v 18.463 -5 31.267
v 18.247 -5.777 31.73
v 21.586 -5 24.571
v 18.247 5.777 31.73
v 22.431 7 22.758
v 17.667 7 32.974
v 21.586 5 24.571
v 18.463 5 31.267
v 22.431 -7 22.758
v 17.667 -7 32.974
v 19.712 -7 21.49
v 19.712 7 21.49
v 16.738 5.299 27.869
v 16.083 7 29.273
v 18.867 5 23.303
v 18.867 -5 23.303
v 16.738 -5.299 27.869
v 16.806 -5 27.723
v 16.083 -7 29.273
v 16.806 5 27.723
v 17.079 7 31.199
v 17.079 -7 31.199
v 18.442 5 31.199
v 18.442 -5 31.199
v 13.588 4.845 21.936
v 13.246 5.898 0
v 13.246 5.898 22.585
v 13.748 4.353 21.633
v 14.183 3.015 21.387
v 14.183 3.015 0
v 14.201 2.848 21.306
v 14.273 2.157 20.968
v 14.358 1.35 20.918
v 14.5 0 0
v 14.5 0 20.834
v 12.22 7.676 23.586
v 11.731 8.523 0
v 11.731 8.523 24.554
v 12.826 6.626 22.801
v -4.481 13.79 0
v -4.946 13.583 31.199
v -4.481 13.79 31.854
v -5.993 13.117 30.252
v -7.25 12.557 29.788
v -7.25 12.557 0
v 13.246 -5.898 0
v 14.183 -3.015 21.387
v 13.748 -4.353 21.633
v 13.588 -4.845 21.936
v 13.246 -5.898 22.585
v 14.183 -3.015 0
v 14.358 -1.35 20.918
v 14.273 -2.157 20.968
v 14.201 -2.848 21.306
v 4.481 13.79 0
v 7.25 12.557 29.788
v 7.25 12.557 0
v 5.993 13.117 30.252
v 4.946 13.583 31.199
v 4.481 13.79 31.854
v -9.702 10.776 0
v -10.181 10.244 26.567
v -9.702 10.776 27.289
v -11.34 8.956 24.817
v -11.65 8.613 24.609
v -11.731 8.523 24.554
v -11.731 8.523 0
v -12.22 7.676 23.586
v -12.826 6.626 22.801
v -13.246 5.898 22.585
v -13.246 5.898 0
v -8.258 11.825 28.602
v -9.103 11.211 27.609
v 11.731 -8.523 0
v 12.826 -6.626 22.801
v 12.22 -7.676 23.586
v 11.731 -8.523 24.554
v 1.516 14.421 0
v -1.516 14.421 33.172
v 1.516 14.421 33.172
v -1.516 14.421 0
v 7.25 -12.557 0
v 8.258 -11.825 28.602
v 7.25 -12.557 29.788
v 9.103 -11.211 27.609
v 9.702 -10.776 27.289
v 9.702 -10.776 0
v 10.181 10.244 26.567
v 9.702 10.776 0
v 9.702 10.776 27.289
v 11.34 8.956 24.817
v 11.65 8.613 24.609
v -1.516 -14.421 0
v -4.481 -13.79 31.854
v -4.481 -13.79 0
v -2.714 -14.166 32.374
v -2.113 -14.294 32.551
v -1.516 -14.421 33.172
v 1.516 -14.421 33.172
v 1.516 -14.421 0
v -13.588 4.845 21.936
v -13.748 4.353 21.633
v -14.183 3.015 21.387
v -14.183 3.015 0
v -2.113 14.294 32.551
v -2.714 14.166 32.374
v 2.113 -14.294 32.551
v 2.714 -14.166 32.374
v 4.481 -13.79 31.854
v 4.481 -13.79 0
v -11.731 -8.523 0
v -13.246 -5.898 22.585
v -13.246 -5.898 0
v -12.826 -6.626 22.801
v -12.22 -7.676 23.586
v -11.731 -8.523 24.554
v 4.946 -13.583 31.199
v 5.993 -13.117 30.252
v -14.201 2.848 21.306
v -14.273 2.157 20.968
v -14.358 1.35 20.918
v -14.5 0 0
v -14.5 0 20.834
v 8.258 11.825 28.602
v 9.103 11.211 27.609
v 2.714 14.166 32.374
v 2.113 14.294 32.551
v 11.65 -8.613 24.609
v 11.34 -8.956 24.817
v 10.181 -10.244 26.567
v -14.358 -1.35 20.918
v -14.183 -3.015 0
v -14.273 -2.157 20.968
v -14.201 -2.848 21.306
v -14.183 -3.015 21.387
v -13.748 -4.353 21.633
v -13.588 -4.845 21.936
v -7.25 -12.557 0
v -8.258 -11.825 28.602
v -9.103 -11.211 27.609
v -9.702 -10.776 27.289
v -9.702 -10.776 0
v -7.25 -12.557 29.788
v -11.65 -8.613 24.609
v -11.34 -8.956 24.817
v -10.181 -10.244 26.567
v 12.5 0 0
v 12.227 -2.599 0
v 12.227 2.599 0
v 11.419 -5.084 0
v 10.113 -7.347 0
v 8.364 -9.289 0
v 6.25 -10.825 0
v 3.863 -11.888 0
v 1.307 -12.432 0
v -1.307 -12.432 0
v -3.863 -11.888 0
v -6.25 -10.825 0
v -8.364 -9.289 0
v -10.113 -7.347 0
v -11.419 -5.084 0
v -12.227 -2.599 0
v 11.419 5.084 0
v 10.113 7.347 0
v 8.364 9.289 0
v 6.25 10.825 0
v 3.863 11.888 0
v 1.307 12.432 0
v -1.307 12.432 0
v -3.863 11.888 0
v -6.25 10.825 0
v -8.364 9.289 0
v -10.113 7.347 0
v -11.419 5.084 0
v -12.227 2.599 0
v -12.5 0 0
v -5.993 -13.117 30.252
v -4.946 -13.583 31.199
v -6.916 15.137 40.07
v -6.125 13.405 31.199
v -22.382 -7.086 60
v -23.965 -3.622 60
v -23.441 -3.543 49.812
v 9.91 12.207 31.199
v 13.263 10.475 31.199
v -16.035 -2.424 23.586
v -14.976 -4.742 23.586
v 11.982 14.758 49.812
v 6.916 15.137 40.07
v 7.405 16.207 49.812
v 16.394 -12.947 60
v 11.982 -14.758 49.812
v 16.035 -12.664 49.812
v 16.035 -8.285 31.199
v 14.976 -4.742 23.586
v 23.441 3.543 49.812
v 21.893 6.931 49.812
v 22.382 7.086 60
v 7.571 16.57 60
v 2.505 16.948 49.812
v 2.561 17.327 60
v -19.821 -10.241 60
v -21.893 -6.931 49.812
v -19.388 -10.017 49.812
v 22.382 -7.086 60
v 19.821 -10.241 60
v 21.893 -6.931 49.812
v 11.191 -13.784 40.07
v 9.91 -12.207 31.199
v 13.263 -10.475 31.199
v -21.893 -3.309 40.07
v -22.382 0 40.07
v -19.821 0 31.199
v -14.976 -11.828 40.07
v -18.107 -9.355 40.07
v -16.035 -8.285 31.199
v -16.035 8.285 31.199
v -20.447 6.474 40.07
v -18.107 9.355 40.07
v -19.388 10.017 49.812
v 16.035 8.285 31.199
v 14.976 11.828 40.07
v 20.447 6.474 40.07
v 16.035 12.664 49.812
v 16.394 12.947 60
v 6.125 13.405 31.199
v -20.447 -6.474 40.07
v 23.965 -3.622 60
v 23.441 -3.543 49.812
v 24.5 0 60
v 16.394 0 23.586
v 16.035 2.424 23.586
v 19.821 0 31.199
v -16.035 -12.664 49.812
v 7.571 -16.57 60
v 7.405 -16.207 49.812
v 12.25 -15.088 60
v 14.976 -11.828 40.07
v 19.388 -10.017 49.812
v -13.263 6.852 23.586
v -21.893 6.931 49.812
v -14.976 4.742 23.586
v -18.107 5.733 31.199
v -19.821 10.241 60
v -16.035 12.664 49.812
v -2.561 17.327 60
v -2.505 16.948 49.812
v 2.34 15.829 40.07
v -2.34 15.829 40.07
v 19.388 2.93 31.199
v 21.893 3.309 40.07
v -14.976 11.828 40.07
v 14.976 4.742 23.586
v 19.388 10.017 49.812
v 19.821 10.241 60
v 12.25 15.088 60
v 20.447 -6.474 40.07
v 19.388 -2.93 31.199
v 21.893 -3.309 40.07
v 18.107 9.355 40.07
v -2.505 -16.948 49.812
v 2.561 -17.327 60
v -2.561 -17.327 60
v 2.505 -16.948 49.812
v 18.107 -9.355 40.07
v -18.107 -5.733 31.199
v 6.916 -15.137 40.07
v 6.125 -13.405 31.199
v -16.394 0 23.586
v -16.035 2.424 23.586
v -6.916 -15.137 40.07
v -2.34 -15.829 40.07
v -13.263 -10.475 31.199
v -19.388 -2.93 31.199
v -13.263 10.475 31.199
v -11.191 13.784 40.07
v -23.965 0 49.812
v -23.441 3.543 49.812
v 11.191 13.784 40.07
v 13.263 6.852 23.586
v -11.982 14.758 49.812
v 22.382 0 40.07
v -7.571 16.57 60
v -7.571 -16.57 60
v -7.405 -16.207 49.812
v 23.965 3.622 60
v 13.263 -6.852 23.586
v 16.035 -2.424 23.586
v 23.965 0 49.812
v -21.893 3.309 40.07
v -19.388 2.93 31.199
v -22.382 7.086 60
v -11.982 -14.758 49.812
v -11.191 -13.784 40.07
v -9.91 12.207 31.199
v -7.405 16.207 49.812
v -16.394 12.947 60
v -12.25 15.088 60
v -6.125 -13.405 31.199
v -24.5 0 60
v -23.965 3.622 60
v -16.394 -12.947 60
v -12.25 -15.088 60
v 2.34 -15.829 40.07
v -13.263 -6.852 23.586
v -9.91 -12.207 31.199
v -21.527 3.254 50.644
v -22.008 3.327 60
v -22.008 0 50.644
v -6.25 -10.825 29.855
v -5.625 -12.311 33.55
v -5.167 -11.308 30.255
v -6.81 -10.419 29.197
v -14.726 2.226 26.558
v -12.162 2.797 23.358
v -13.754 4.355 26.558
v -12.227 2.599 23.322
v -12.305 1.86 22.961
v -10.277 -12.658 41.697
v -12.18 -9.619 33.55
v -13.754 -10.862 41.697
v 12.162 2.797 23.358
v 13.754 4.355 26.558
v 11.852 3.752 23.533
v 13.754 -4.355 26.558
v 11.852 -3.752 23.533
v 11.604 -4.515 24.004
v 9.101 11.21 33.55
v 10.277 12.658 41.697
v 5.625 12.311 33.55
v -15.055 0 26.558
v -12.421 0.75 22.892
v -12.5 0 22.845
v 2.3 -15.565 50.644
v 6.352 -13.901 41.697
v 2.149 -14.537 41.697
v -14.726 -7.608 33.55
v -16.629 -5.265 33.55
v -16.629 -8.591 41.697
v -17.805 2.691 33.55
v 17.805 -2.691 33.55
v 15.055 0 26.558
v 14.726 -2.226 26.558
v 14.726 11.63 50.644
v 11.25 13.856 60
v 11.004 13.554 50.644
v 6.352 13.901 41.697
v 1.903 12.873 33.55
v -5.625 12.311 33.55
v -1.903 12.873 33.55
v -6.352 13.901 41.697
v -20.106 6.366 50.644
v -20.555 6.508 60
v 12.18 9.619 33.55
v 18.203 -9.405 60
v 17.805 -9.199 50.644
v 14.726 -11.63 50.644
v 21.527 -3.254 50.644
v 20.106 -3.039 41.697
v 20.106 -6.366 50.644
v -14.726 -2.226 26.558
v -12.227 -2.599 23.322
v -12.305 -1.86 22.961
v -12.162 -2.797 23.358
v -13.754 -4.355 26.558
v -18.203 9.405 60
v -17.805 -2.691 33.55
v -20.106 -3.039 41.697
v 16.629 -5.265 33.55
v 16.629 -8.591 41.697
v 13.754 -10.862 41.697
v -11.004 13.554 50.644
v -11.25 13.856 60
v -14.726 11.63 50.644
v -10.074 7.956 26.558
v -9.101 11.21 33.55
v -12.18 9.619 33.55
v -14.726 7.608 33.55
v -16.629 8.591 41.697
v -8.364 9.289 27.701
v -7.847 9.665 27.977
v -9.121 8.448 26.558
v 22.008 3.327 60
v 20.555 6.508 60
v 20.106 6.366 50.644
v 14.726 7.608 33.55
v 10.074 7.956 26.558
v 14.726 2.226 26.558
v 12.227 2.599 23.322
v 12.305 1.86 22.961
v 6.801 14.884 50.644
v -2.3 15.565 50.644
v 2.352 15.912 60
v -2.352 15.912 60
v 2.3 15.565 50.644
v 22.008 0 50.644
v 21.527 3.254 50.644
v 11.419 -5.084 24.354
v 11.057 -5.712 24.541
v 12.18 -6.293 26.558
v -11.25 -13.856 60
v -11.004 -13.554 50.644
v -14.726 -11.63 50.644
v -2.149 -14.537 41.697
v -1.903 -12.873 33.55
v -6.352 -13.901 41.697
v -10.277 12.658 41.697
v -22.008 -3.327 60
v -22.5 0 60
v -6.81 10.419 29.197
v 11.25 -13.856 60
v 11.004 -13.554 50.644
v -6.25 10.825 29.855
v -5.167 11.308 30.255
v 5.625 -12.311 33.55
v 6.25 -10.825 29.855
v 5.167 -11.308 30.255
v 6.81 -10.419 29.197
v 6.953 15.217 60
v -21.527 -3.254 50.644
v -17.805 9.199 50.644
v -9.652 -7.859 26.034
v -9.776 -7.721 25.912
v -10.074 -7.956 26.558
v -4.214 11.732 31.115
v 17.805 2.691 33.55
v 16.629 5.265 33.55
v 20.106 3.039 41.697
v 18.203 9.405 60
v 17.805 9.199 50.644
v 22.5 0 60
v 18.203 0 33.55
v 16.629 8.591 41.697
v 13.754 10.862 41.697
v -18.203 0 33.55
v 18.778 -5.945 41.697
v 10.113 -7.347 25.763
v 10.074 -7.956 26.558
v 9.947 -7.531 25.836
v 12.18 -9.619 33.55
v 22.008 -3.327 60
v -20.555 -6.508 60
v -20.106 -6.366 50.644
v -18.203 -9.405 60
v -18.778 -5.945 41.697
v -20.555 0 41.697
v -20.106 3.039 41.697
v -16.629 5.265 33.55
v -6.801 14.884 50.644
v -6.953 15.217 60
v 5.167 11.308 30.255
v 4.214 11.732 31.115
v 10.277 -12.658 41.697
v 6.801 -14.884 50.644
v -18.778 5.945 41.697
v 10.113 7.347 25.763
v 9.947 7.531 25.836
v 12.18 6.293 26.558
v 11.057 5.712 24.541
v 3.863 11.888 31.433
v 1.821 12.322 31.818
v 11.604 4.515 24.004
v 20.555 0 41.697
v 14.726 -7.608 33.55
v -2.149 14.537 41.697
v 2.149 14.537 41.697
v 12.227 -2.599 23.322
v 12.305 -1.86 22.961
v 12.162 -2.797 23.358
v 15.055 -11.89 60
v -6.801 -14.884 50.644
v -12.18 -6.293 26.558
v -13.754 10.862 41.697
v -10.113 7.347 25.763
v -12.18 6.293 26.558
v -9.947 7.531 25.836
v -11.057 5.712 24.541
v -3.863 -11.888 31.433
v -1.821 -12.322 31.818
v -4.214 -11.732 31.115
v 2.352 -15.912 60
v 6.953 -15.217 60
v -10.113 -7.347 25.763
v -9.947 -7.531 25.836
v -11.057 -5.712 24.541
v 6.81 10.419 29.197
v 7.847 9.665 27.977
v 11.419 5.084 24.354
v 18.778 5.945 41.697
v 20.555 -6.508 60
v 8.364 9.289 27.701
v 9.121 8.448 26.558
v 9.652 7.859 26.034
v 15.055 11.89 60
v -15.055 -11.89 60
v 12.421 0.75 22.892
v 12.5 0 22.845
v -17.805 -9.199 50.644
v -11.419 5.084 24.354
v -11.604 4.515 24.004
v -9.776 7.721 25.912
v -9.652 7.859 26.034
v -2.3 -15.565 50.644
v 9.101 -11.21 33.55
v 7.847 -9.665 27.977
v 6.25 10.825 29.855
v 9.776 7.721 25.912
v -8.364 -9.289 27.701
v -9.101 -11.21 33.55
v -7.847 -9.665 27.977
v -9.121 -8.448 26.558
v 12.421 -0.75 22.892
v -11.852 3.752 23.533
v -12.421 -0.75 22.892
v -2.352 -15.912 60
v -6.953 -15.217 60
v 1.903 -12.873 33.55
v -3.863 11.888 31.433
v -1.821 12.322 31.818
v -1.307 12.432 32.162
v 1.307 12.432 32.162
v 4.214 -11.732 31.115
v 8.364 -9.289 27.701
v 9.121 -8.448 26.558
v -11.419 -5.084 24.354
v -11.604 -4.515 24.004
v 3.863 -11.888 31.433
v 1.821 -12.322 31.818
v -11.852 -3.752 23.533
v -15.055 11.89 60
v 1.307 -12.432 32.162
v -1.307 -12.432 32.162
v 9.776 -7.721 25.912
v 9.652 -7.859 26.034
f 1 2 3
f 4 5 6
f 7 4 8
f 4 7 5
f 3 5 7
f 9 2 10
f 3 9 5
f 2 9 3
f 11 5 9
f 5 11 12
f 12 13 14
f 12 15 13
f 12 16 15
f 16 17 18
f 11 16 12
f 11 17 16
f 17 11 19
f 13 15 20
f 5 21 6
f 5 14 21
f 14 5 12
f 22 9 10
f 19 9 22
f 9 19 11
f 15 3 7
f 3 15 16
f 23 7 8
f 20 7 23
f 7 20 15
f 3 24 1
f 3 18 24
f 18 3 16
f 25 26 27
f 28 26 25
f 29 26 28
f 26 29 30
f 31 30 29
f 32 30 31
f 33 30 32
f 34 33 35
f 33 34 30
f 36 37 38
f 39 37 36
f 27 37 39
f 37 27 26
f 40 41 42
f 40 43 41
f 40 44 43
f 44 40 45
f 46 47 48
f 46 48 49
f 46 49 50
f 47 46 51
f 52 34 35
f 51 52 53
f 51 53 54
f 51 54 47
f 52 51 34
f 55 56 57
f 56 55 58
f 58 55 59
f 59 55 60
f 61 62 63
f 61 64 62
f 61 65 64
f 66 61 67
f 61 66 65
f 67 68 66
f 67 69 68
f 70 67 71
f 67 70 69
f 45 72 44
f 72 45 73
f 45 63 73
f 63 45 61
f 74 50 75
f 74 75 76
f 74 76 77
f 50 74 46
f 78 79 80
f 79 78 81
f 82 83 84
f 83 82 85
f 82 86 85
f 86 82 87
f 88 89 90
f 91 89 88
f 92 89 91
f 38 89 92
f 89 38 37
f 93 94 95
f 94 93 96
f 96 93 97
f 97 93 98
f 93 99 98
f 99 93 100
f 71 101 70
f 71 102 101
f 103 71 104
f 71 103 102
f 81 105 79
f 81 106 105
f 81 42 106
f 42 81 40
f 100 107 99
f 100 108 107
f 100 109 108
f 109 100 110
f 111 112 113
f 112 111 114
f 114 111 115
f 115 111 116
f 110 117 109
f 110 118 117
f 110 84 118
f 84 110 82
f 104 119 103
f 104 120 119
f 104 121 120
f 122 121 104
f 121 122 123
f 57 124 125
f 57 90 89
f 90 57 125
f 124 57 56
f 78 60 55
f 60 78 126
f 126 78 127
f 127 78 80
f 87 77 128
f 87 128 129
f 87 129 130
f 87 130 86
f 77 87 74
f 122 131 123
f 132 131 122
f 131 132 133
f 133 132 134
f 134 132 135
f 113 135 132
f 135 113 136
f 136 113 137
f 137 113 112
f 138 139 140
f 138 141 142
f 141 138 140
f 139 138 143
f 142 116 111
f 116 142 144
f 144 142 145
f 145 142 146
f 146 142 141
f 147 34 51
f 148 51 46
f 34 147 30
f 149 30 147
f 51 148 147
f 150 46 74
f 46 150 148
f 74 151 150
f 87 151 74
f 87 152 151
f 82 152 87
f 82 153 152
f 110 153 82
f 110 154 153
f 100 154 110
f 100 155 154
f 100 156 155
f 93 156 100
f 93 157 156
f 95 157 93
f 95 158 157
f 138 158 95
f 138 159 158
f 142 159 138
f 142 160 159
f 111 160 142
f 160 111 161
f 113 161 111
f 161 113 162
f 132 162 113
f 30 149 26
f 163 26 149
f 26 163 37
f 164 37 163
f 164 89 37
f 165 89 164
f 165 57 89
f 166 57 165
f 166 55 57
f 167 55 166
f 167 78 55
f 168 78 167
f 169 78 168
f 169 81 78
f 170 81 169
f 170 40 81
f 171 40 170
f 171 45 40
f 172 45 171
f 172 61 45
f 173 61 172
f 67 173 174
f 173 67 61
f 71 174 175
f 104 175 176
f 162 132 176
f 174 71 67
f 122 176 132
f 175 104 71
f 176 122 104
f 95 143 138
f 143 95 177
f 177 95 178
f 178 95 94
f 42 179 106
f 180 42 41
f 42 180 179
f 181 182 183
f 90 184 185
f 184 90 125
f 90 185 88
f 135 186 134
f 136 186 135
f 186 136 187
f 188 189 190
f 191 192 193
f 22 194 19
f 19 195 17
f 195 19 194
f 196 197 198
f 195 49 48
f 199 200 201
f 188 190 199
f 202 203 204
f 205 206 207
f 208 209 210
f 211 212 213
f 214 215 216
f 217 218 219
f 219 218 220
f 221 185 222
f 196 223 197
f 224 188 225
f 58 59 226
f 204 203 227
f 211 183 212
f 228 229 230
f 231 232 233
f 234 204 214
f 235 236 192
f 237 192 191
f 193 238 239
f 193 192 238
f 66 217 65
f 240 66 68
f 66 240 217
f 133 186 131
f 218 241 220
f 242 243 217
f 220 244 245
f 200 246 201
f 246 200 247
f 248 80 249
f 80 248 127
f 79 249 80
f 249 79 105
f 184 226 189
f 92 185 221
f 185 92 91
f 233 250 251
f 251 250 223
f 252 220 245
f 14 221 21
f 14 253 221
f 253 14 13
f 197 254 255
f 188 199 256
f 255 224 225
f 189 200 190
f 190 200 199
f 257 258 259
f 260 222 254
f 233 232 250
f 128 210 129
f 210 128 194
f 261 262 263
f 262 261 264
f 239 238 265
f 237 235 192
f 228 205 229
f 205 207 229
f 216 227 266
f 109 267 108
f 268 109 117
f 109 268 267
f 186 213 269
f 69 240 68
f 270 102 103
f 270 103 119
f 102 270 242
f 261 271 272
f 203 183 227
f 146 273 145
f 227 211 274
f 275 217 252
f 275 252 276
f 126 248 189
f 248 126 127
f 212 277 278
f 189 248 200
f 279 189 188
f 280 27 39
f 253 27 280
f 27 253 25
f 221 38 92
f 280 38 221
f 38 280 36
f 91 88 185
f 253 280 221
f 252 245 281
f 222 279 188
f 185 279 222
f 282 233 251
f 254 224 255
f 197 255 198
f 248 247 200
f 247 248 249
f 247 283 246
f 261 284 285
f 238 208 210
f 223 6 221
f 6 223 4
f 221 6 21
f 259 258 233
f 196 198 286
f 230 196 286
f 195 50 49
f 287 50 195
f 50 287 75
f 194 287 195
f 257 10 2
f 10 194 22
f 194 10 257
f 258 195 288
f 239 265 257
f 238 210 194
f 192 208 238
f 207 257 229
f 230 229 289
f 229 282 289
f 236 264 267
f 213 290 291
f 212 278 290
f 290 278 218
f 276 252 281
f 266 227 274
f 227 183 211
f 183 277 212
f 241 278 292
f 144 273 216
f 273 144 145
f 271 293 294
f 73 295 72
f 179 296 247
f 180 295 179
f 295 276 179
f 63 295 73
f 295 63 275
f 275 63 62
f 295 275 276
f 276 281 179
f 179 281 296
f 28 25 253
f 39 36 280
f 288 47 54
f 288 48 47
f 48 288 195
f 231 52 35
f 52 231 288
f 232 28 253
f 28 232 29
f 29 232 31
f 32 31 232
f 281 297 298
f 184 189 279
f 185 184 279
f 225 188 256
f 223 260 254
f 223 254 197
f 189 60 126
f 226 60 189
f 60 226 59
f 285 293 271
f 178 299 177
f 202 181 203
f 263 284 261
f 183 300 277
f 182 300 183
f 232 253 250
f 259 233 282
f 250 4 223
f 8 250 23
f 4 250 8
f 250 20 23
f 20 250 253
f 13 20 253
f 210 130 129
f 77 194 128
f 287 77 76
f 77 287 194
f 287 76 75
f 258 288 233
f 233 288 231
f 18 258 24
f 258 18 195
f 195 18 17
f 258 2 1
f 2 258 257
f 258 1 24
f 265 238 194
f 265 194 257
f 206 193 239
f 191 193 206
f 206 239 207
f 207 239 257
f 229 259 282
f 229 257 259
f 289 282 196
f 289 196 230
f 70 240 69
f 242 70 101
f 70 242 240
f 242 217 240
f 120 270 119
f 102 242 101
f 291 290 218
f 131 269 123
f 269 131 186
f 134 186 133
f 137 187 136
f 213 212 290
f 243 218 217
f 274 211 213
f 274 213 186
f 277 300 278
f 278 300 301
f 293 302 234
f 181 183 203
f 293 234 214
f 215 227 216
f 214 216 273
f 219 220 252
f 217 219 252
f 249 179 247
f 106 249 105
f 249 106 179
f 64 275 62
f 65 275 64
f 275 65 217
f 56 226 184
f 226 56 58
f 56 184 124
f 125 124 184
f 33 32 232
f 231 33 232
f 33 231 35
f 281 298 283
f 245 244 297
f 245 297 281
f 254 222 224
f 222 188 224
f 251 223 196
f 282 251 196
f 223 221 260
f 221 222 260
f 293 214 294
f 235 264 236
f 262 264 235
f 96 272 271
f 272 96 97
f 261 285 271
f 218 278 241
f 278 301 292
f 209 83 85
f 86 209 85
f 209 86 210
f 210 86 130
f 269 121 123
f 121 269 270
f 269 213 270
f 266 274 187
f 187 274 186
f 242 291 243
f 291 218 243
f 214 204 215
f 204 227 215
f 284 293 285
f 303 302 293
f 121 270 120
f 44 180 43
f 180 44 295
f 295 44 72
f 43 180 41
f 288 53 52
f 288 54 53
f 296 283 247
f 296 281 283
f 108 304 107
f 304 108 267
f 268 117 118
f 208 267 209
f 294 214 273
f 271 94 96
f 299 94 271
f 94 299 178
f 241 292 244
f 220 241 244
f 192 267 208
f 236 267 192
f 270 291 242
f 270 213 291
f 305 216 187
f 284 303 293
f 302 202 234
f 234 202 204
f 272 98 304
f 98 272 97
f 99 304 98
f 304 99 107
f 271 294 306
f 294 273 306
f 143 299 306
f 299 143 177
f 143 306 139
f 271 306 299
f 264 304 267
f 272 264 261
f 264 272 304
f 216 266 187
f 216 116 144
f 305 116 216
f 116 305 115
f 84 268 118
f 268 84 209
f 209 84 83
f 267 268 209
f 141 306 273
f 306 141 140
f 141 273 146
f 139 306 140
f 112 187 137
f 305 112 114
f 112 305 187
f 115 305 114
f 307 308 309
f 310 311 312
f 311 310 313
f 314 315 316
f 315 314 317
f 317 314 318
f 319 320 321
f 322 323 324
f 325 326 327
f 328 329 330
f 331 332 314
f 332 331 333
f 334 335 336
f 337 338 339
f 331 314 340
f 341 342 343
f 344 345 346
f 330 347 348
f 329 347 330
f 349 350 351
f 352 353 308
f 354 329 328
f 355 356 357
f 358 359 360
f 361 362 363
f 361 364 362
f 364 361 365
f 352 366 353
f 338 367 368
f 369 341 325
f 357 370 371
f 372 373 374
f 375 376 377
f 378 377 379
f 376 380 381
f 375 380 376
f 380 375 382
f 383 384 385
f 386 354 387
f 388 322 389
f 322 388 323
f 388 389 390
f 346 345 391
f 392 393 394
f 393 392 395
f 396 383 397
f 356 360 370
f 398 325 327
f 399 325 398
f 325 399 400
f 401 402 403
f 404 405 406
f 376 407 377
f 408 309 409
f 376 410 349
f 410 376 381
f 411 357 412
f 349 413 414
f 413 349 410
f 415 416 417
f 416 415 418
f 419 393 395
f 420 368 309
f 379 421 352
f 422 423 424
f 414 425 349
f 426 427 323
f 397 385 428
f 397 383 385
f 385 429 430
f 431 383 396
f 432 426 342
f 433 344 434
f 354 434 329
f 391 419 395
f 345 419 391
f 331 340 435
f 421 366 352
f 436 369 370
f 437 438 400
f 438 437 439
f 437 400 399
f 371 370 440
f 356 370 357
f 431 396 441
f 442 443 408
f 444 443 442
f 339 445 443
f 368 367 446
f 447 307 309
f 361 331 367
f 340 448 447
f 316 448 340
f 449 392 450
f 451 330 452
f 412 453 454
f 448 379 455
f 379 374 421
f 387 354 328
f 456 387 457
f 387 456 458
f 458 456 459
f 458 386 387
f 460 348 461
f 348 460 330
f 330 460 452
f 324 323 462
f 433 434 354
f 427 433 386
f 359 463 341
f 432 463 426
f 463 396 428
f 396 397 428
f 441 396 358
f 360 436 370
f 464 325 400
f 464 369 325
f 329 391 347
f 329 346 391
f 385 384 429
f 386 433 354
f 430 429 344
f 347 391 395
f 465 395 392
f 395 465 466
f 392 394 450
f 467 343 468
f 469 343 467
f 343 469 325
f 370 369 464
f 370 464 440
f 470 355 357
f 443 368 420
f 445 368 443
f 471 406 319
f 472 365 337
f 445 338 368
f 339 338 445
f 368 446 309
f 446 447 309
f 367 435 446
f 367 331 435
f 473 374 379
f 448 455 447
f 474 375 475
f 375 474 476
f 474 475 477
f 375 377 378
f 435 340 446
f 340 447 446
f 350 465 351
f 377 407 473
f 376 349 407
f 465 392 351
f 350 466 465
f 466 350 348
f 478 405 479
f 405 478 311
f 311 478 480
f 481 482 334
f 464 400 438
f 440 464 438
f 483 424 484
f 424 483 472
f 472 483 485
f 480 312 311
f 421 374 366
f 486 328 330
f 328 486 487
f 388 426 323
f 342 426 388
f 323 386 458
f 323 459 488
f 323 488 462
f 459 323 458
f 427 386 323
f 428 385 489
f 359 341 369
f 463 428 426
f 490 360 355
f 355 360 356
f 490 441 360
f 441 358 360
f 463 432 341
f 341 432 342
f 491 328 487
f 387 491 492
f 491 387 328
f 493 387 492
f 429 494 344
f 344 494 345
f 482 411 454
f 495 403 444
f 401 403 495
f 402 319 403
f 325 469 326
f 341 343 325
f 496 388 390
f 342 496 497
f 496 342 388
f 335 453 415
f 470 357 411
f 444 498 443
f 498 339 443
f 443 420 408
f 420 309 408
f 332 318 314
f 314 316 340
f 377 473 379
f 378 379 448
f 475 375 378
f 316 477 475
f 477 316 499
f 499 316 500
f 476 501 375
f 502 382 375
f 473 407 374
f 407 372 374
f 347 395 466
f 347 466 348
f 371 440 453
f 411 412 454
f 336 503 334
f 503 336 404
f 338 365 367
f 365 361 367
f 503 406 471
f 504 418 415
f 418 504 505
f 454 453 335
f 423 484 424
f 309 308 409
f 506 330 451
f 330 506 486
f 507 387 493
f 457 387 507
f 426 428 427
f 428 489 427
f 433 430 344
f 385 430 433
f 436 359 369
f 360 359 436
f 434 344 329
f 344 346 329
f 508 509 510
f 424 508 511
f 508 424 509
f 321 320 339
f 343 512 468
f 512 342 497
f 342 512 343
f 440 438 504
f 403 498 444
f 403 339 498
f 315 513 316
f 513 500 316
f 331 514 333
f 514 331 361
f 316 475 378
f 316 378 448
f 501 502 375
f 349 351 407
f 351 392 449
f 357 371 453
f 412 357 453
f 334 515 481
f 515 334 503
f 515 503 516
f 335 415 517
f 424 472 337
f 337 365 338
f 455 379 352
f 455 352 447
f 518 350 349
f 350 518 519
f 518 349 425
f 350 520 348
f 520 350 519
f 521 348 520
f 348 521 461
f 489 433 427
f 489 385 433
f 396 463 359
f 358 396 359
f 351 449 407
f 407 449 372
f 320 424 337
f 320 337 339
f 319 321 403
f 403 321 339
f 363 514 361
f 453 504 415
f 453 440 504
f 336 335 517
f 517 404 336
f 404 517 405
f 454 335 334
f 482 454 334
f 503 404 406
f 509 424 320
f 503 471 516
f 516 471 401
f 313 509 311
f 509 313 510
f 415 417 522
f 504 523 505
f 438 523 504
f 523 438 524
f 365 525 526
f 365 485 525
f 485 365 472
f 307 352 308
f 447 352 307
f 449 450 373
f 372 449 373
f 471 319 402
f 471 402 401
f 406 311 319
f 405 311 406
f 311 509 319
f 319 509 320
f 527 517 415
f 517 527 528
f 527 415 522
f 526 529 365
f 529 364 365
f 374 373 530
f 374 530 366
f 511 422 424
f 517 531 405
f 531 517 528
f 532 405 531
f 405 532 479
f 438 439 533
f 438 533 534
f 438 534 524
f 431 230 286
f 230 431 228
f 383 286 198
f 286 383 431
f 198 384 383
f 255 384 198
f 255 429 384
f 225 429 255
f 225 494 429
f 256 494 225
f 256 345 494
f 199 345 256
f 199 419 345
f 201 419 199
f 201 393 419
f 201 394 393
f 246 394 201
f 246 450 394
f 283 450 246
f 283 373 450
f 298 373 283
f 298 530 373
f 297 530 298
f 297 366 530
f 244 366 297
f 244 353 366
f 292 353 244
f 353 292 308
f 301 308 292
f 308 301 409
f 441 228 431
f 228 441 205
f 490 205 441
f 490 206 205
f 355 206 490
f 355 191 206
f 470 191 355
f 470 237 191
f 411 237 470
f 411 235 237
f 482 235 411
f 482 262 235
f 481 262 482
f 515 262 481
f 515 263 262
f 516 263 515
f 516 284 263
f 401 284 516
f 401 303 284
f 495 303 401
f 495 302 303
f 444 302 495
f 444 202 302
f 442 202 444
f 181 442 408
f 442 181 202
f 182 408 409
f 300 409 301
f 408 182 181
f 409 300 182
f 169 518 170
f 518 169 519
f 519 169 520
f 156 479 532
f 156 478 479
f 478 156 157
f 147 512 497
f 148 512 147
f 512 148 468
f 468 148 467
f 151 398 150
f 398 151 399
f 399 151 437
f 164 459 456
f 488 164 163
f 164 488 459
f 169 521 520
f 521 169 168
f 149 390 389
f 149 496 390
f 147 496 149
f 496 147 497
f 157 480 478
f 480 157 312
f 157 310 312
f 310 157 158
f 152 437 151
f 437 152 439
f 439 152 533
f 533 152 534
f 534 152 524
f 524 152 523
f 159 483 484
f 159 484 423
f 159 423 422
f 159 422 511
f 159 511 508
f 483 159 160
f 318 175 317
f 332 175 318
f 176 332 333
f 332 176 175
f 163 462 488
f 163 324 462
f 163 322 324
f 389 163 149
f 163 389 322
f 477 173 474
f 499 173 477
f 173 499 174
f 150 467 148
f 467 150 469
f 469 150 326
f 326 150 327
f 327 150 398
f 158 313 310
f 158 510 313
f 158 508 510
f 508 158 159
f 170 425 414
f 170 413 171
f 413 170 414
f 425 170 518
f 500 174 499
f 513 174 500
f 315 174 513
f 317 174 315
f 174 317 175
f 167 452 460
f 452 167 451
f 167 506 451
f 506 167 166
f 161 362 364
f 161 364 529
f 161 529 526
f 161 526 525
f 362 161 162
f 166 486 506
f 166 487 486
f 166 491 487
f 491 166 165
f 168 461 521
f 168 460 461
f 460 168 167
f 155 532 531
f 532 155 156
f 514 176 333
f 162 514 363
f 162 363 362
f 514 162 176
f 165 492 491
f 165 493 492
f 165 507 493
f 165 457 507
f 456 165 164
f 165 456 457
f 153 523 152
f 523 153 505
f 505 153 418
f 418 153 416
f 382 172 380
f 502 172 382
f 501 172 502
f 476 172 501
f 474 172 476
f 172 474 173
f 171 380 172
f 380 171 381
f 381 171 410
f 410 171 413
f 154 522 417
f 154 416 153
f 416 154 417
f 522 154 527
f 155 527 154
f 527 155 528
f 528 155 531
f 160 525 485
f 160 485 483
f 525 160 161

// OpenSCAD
$fn=30;
r=0;

x=45;
y=32;
z=x*2;
t=2;
bx=120;
by=29;

cx=3;
cy=14;
cz=24;
ct=4;

rotate([0,r,0]) difference() {
    union() {
        cylinder(bx,by/2,by/2);
        translate([0,0,bx/2]) scale([1,y/x,z/x]) sphere(x/2+t);
        translate([16,0,33]) rotate([0,-25,0]) difference() {
            cube([cx,cy,cz], center = true);
            cube([cx,cy-ct,cz-ct], center = true);
        }
    }
    translate([0,0,bx/2]) scale([1,y/x,z/x]) sphere(x/2);   
    translate([0,0,bx/2+x+t]) cube((x+t)*2, center = true);
    cylinder(bx,by/2-t,by/2-t);
}
